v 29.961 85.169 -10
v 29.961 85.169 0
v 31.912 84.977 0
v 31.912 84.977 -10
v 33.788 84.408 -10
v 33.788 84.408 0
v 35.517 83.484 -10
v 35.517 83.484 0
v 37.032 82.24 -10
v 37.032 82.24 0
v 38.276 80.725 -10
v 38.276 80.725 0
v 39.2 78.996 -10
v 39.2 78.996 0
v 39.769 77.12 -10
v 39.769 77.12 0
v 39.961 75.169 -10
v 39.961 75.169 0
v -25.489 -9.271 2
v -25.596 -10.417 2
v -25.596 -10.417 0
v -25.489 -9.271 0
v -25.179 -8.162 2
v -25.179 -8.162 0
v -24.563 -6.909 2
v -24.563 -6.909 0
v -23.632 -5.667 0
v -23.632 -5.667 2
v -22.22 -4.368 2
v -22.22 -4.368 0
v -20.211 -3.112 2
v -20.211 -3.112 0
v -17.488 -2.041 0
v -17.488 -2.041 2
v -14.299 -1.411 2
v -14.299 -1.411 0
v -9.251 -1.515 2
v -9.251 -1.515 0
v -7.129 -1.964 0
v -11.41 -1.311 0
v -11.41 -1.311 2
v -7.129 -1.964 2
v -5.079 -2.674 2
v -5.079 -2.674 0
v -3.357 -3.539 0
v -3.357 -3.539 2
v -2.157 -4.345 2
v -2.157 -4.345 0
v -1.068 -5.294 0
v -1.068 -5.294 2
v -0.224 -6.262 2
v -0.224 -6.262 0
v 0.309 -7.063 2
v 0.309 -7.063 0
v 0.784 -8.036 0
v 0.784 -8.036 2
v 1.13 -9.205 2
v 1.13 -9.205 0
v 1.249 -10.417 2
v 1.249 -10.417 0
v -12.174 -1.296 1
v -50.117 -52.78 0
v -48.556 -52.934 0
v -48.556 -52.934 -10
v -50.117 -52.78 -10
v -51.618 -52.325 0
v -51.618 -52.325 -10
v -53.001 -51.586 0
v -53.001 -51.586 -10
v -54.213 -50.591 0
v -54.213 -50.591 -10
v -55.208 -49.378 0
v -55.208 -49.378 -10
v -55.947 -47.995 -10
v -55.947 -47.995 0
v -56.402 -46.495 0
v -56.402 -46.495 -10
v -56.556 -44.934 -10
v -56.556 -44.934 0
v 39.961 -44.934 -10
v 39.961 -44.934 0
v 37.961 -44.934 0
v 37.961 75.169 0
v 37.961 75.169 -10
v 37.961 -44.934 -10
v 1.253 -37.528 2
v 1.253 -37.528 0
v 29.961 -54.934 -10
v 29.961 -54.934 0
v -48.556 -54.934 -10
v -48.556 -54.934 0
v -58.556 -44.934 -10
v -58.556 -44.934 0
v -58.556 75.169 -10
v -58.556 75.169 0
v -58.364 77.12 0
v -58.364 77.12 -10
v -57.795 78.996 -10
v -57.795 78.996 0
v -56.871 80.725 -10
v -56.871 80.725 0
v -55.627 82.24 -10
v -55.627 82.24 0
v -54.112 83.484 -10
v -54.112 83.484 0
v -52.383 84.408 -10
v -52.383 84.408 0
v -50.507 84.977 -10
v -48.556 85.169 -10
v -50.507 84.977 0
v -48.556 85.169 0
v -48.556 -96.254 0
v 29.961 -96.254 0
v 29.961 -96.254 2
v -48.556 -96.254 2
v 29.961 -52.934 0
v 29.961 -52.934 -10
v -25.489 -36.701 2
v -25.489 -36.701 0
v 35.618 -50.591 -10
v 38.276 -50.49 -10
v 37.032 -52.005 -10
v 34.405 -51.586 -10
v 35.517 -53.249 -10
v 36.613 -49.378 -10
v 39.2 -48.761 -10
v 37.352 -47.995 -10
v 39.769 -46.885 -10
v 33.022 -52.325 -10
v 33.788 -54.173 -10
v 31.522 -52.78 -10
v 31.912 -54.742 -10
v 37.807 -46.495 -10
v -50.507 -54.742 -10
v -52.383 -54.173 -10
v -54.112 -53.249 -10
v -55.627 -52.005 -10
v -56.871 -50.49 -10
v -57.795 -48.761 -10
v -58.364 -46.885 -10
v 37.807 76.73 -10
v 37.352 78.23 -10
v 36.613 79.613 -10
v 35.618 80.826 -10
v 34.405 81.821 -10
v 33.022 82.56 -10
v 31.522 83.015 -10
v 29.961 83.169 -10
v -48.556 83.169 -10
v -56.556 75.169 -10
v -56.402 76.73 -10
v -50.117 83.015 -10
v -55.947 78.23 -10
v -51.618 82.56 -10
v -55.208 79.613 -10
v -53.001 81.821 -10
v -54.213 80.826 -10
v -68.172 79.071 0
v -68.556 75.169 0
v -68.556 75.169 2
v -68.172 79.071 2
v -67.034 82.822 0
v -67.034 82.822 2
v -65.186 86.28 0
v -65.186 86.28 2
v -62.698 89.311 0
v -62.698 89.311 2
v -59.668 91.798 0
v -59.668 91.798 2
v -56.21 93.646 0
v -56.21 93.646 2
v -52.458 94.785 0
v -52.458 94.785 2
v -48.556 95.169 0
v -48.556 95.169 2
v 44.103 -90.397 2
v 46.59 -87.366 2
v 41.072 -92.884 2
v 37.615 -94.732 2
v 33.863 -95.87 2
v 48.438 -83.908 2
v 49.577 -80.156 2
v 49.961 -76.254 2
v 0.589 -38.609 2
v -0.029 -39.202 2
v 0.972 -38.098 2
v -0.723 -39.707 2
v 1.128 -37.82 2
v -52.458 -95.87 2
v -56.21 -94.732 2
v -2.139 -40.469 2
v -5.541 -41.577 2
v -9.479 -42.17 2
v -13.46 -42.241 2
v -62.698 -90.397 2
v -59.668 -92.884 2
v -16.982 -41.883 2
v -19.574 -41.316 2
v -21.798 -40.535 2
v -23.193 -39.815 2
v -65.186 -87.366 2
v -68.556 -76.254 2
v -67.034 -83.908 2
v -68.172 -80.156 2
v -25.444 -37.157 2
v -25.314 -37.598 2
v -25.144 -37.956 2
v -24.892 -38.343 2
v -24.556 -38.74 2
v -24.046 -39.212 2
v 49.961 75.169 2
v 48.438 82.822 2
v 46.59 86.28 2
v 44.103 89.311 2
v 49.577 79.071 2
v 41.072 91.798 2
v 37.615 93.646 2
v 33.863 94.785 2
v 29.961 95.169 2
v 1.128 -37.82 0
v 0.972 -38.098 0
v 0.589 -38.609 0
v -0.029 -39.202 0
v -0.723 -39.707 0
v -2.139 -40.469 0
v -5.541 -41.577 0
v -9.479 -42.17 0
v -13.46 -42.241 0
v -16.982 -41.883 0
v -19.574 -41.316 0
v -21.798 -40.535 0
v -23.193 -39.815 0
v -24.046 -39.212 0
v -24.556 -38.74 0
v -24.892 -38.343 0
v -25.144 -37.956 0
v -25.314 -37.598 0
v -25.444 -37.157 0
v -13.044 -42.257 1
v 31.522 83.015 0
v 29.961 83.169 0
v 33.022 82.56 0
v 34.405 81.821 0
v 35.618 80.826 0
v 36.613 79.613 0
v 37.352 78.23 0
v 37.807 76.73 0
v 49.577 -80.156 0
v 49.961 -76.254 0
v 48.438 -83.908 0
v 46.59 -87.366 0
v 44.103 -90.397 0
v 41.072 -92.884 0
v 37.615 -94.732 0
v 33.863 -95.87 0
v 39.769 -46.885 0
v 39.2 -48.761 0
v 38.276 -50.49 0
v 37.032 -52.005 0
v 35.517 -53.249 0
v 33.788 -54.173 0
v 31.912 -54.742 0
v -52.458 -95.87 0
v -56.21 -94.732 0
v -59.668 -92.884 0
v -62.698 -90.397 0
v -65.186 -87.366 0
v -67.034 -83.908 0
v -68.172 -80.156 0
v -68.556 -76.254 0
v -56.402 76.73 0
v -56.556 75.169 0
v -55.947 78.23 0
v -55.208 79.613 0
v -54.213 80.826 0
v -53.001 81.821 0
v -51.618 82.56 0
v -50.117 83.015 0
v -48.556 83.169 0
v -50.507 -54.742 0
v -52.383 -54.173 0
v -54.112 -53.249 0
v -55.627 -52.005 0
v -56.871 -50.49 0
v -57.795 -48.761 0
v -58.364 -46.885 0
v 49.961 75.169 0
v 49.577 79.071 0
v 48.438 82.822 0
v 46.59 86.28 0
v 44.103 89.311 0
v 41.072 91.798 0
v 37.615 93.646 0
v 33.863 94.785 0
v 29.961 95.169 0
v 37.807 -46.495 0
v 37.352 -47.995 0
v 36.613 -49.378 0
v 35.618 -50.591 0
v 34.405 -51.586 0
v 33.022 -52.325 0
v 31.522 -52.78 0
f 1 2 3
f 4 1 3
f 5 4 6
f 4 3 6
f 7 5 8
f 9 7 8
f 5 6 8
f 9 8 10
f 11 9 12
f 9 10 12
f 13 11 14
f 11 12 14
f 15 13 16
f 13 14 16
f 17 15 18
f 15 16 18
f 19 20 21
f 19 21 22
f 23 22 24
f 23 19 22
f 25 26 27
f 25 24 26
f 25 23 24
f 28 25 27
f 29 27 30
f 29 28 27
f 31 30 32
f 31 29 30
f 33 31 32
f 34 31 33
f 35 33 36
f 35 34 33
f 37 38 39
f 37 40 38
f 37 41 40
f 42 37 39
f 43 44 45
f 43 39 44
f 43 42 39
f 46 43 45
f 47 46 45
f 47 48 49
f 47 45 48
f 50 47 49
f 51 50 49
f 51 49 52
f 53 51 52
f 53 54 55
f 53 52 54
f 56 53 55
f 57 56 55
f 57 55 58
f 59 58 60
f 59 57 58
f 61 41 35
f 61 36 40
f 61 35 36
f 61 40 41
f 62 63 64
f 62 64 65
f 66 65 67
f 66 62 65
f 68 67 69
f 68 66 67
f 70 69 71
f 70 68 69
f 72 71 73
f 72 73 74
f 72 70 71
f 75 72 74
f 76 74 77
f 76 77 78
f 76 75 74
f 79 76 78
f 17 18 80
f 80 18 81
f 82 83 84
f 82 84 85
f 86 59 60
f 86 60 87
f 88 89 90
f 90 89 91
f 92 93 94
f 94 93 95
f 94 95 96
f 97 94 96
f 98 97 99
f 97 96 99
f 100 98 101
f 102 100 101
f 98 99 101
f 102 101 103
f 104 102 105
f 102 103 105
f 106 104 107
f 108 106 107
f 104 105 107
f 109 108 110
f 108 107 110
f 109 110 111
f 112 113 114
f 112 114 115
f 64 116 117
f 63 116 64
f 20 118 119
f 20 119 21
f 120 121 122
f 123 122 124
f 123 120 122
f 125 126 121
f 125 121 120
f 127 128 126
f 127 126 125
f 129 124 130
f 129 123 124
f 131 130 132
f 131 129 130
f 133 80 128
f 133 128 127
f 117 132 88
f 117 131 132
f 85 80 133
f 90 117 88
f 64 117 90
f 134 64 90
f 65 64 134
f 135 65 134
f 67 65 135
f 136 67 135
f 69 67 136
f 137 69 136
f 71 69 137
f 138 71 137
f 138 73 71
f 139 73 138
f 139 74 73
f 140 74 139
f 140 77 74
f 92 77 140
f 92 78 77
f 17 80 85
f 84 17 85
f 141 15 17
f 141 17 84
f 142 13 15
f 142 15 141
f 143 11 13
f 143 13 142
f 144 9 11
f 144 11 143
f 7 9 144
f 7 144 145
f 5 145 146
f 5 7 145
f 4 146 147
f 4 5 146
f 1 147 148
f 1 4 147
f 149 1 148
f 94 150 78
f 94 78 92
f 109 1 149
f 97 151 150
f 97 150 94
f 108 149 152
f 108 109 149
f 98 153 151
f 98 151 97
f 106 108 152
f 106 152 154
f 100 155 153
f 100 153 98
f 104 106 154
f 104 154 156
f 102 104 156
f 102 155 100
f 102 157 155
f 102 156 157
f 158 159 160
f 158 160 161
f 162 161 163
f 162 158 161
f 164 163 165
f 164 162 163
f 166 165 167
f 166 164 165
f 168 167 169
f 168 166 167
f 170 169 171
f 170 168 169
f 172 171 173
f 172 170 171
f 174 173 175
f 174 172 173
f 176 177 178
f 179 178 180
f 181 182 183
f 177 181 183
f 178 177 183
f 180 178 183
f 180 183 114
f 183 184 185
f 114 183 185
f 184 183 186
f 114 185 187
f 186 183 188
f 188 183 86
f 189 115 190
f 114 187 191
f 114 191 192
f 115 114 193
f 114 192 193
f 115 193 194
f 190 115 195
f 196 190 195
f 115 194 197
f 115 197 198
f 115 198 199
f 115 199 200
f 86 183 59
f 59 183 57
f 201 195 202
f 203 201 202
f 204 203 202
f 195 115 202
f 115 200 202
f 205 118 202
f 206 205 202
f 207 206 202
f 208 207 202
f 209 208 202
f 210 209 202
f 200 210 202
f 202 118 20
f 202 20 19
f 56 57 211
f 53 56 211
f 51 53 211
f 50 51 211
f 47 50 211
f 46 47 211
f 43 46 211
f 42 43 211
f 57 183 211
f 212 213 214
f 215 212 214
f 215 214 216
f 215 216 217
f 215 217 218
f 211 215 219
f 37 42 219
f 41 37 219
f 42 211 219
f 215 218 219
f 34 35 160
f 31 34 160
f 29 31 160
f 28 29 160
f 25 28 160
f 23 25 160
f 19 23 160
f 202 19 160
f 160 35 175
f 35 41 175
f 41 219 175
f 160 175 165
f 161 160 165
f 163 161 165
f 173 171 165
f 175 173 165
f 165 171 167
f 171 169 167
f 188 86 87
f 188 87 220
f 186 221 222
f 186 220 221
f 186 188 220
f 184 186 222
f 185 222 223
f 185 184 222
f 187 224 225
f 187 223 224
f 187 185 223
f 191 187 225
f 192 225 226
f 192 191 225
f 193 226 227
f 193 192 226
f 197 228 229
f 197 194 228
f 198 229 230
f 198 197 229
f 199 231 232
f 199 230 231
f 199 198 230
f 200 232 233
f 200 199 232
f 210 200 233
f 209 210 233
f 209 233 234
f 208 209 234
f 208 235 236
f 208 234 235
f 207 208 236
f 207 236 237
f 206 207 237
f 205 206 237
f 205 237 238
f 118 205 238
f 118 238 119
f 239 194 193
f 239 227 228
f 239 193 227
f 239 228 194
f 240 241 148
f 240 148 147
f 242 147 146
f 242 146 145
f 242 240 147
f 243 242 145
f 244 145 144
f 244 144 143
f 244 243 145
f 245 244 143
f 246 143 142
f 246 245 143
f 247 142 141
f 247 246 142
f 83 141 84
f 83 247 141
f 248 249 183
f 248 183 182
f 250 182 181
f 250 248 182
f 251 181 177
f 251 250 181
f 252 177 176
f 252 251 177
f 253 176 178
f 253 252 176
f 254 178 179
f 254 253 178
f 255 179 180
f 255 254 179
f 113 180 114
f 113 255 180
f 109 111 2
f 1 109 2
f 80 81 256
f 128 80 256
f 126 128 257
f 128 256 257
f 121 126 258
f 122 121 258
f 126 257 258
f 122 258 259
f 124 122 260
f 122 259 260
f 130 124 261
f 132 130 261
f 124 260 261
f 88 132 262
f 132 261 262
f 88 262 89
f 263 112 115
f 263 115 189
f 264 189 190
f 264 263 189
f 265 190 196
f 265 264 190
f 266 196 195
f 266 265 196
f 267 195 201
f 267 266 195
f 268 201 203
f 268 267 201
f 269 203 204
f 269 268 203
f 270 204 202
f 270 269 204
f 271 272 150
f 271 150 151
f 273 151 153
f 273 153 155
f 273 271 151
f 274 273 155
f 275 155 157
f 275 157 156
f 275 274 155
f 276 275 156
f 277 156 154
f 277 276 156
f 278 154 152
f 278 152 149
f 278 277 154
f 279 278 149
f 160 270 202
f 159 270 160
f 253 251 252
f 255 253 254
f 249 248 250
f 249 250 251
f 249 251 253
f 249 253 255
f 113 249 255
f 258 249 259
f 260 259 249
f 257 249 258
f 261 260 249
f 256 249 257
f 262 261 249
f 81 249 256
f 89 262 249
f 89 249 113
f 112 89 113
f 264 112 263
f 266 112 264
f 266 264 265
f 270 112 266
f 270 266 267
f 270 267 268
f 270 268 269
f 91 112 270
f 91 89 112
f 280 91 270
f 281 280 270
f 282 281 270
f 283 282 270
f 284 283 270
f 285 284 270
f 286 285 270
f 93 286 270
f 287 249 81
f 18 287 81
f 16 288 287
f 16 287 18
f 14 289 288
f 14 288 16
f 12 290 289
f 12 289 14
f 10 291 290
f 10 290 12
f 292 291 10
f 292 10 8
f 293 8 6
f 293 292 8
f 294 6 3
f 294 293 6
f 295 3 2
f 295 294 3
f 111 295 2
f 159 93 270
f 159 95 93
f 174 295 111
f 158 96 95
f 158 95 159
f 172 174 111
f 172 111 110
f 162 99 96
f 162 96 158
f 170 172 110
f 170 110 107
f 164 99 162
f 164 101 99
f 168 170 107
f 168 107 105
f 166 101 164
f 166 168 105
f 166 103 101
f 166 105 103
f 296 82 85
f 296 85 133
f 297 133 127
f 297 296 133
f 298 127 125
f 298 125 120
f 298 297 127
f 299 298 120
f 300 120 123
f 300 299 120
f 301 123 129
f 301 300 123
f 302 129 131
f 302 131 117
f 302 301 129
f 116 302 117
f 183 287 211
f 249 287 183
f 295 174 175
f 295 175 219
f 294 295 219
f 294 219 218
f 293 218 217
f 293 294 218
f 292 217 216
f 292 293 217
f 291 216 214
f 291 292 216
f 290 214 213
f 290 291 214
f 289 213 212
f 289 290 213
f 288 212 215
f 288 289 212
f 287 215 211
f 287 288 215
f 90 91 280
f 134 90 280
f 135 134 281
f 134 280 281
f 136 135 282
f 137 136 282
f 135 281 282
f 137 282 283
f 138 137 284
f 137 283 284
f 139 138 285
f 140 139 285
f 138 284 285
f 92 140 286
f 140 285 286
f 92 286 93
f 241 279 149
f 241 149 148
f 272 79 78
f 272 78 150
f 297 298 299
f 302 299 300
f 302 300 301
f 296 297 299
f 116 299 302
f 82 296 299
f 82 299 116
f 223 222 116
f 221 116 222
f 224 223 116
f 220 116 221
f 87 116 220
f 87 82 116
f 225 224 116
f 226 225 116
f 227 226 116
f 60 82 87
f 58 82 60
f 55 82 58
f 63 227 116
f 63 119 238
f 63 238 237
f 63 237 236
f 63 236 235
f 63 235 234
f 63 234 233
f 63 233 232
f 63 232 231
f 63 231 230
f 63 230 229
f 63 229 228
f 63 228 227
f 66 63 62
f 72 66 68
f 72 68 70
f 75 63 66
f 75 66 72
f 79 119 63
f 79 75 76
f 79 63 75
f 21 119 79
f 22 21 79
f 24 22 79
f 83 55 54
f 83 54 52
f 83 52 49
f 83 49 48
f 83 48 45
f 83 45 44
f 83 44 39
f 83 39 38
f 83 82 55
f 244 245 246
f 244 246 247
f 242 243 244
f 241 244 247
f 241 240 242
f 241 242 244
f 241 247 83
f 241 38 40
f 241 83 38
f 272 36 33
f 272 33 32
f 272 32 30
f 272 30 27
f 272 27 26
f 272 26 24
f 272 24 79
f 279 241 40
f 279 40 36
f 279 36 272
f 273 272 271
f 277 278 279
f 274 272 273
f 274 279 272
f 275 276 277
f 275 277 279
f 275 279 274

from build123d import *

# Parameters (mm, degrees)
BOSS_EXTRUDE1_DEPTH     = 2
BOSS_EXTRUDE2_DEPTH     = 10
CUT_EXTRUDE1_DEPTH      = 119.595420067
CUT_EXTRUDE1_DEPTH_BACK = 119.595420067


with BuildPart() as part:
    # Sketch1 → Boss-Extrude1 (new body)
    with BuildSketch(Plane.XY):
        with BuildLine():
            Line((-48.55615004, 95.168805411), (29.960861776, 95.168805411))
            ThreePointArc((29.960861776, 95.168805411), (44.1029974, 89.310941035), (49.960861776, 75.168805411))
            Line((49.960861776, 75.168805411), (49.960861776, -76.254495753))
            ThreePointArc((49.960861776, -76.254495753), (44.1029974, -90.396631376), (29.960861776, -96.254495753))
            Line((29.960861776, -96.254495753), (-48.556149966, -96.254495753))
            ThreePointArc((-48.556149966, -96.254495753), (-62.698285587, -90.39663138), (-68.556149966, -76.254495762))
            Line((-68.556149966, -76.254495762), (-68.55615004, 75.168805401))
            ThreePointArc((-68.55615004, 75.168805401), (-62.698285667, 89.310941031), (-48.55615004, 95.168805411))
        make_face()
    extrude(amount=BOSS_EXTRUDE1_DEPTH)

    # Sketch1<3> → Boss-Extrude2 (add)
    with BuildSketch(Plane.XY):
        with BuildLine():
            Line((29.960861776, 85.168805411), (-48.55615004, 85.168805411))
            ThreePointArc((-48.55615004, 85.168805411), (-55.627217853, 82.239873221), (-58.55615004, 75.168805406))
            Line((-58.55615004, 75.168805406), (-58.556149982, -44.933857006))
            ThreePointArc((-58.556149982, -44.933857006), (-55.627217792, -52.004924815), (-48.556149982, -54.933857001))
            Line((-48.556149982, -54.933857001), (29.960861776, -54.933857001))
            ThreePointArc((29.960861776, -54.933857001), (37.031929588, -52.004924813), (39.960861776, -44.933857001))
            Line((39.960861776, -44.933857001), (39.960861776, 75.168805411))
            ThreePointArc((39.960861776, 75.168805411), (37.031929588, 82.239873223), (29.960861776, 85.168805411))
        make_face()
        with BuildLine():
            ThreePointArc((-56.55615004, 75.168805407), (-54.213004291, 80.825659659), (-48.55615004, 83.168805411))
            Line((-48.55615004, 83.168805411), (29.960861776, 83.168805411))
            ThreePointArc((29.960861776, 83.168805411), (35.617716026, 80.82565966), (37.960861776, 75.168805411))
            Line((37.960861776, 75.168805411), (37.960861776, -44.933856987))
            ThreePointArc((37.960861776, -44.933856987), (35.617716026, -50.590711236), (29.960861776, -52.933856987))
            Line((29.960861776, -52.933856987), (-48.556149982, -52.933856987))
            ThreePointArc((-48.556149982, -52.933856987), (-54.21300423, -50.590711237), (-56.556149982, -44.93385699))
            Line((-56.556149982, -44.93385699), (-56.55615004, 75.168805407))
        make_face(mode=Mode.SUBTRACT)
    extrude(amount=-BOSS_EXTRUDE2_DEPTH)

    # Sketch3 → Cut-Extrude1 (cut, two sides: drawn at the far end of the back side and taken through both)
    with BuildSketch(Plane(origin=(0, 0, 0), x_dir=(-1, 0, 0), z_dir=(0, 0, -1)).offset(-CUT_EXTRUDE1_DEPTH_BACK)):
        with BuildLine():
            Line((25.489402973, -36.700798798), (25.595818918, -10.417445008))
            add(Edge.make_bspline(
                [(25.595818918, -10.417445008), (25.595818918, -1.296173206), (12.173879387, -1.295746312), (-1.248060145, -1.295319417), (-1.249316495, -10.416591179)],
                knots=[0, 0, 0, 1.570749525, 1.570749525, 3.141499049, 3.141499049, 3.141499049], degree=2, weights=[1, 0.707123328, 1, 0.707123328, 1]))
            Line((-1.249316495, -10.416591179), (-1.253050558, -37.527526675))
            add(Edge.make_bspline(
                [(-1.253050558, -37.527526675), (0.598808841, -42.641507472), (13.044105907, -42.256768128), (25.489402973, -41.872028784), (25.489402973, -36.700798798)],
                knots=[0.148937555, 0.148937555, 0.148937555, 1.645265104, 1.645265104, 3.141592654, 3.141592654, 3.141592654], degree=2, weights=[1, 0.732939277, 1, 0.732939277, 1]))
        make_face()
    extrude(amount=CUT_EXTRUDE1_DEPTH + CUT_EXTRUDE1_DEPTH_BACK, mode=Mode.SUBTRACT)


solid = part.part
